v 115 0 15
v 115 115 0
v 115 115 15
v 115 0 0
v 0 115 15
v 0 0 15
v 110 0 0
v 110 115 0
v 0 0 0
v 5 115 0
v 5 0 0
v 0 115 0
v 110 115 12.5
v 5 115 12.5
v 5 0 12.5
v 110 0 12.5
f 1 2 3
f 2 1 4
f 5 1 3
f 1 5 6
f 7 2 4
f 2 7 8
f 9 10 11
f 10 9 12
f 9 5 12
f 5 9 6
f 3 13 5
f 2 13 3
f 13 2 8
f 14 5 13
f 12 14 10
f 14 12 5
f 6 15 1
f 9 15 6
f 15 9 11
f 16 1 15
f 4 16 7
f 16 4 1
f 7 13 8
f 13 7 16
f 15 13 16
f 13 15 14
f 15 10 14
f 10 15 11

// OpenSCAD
module bed_bracket() {
  margin = 5;
  outer = 105;
  inner = 42;
  height = 15;
  difference() {
      cube([outer+2*margin,outer+2*margin,height]);
      translate([margin,0,0])
        cube([outer,outer+2*margin,height-margin/2]) ;
  };

}
bed_bracket();
